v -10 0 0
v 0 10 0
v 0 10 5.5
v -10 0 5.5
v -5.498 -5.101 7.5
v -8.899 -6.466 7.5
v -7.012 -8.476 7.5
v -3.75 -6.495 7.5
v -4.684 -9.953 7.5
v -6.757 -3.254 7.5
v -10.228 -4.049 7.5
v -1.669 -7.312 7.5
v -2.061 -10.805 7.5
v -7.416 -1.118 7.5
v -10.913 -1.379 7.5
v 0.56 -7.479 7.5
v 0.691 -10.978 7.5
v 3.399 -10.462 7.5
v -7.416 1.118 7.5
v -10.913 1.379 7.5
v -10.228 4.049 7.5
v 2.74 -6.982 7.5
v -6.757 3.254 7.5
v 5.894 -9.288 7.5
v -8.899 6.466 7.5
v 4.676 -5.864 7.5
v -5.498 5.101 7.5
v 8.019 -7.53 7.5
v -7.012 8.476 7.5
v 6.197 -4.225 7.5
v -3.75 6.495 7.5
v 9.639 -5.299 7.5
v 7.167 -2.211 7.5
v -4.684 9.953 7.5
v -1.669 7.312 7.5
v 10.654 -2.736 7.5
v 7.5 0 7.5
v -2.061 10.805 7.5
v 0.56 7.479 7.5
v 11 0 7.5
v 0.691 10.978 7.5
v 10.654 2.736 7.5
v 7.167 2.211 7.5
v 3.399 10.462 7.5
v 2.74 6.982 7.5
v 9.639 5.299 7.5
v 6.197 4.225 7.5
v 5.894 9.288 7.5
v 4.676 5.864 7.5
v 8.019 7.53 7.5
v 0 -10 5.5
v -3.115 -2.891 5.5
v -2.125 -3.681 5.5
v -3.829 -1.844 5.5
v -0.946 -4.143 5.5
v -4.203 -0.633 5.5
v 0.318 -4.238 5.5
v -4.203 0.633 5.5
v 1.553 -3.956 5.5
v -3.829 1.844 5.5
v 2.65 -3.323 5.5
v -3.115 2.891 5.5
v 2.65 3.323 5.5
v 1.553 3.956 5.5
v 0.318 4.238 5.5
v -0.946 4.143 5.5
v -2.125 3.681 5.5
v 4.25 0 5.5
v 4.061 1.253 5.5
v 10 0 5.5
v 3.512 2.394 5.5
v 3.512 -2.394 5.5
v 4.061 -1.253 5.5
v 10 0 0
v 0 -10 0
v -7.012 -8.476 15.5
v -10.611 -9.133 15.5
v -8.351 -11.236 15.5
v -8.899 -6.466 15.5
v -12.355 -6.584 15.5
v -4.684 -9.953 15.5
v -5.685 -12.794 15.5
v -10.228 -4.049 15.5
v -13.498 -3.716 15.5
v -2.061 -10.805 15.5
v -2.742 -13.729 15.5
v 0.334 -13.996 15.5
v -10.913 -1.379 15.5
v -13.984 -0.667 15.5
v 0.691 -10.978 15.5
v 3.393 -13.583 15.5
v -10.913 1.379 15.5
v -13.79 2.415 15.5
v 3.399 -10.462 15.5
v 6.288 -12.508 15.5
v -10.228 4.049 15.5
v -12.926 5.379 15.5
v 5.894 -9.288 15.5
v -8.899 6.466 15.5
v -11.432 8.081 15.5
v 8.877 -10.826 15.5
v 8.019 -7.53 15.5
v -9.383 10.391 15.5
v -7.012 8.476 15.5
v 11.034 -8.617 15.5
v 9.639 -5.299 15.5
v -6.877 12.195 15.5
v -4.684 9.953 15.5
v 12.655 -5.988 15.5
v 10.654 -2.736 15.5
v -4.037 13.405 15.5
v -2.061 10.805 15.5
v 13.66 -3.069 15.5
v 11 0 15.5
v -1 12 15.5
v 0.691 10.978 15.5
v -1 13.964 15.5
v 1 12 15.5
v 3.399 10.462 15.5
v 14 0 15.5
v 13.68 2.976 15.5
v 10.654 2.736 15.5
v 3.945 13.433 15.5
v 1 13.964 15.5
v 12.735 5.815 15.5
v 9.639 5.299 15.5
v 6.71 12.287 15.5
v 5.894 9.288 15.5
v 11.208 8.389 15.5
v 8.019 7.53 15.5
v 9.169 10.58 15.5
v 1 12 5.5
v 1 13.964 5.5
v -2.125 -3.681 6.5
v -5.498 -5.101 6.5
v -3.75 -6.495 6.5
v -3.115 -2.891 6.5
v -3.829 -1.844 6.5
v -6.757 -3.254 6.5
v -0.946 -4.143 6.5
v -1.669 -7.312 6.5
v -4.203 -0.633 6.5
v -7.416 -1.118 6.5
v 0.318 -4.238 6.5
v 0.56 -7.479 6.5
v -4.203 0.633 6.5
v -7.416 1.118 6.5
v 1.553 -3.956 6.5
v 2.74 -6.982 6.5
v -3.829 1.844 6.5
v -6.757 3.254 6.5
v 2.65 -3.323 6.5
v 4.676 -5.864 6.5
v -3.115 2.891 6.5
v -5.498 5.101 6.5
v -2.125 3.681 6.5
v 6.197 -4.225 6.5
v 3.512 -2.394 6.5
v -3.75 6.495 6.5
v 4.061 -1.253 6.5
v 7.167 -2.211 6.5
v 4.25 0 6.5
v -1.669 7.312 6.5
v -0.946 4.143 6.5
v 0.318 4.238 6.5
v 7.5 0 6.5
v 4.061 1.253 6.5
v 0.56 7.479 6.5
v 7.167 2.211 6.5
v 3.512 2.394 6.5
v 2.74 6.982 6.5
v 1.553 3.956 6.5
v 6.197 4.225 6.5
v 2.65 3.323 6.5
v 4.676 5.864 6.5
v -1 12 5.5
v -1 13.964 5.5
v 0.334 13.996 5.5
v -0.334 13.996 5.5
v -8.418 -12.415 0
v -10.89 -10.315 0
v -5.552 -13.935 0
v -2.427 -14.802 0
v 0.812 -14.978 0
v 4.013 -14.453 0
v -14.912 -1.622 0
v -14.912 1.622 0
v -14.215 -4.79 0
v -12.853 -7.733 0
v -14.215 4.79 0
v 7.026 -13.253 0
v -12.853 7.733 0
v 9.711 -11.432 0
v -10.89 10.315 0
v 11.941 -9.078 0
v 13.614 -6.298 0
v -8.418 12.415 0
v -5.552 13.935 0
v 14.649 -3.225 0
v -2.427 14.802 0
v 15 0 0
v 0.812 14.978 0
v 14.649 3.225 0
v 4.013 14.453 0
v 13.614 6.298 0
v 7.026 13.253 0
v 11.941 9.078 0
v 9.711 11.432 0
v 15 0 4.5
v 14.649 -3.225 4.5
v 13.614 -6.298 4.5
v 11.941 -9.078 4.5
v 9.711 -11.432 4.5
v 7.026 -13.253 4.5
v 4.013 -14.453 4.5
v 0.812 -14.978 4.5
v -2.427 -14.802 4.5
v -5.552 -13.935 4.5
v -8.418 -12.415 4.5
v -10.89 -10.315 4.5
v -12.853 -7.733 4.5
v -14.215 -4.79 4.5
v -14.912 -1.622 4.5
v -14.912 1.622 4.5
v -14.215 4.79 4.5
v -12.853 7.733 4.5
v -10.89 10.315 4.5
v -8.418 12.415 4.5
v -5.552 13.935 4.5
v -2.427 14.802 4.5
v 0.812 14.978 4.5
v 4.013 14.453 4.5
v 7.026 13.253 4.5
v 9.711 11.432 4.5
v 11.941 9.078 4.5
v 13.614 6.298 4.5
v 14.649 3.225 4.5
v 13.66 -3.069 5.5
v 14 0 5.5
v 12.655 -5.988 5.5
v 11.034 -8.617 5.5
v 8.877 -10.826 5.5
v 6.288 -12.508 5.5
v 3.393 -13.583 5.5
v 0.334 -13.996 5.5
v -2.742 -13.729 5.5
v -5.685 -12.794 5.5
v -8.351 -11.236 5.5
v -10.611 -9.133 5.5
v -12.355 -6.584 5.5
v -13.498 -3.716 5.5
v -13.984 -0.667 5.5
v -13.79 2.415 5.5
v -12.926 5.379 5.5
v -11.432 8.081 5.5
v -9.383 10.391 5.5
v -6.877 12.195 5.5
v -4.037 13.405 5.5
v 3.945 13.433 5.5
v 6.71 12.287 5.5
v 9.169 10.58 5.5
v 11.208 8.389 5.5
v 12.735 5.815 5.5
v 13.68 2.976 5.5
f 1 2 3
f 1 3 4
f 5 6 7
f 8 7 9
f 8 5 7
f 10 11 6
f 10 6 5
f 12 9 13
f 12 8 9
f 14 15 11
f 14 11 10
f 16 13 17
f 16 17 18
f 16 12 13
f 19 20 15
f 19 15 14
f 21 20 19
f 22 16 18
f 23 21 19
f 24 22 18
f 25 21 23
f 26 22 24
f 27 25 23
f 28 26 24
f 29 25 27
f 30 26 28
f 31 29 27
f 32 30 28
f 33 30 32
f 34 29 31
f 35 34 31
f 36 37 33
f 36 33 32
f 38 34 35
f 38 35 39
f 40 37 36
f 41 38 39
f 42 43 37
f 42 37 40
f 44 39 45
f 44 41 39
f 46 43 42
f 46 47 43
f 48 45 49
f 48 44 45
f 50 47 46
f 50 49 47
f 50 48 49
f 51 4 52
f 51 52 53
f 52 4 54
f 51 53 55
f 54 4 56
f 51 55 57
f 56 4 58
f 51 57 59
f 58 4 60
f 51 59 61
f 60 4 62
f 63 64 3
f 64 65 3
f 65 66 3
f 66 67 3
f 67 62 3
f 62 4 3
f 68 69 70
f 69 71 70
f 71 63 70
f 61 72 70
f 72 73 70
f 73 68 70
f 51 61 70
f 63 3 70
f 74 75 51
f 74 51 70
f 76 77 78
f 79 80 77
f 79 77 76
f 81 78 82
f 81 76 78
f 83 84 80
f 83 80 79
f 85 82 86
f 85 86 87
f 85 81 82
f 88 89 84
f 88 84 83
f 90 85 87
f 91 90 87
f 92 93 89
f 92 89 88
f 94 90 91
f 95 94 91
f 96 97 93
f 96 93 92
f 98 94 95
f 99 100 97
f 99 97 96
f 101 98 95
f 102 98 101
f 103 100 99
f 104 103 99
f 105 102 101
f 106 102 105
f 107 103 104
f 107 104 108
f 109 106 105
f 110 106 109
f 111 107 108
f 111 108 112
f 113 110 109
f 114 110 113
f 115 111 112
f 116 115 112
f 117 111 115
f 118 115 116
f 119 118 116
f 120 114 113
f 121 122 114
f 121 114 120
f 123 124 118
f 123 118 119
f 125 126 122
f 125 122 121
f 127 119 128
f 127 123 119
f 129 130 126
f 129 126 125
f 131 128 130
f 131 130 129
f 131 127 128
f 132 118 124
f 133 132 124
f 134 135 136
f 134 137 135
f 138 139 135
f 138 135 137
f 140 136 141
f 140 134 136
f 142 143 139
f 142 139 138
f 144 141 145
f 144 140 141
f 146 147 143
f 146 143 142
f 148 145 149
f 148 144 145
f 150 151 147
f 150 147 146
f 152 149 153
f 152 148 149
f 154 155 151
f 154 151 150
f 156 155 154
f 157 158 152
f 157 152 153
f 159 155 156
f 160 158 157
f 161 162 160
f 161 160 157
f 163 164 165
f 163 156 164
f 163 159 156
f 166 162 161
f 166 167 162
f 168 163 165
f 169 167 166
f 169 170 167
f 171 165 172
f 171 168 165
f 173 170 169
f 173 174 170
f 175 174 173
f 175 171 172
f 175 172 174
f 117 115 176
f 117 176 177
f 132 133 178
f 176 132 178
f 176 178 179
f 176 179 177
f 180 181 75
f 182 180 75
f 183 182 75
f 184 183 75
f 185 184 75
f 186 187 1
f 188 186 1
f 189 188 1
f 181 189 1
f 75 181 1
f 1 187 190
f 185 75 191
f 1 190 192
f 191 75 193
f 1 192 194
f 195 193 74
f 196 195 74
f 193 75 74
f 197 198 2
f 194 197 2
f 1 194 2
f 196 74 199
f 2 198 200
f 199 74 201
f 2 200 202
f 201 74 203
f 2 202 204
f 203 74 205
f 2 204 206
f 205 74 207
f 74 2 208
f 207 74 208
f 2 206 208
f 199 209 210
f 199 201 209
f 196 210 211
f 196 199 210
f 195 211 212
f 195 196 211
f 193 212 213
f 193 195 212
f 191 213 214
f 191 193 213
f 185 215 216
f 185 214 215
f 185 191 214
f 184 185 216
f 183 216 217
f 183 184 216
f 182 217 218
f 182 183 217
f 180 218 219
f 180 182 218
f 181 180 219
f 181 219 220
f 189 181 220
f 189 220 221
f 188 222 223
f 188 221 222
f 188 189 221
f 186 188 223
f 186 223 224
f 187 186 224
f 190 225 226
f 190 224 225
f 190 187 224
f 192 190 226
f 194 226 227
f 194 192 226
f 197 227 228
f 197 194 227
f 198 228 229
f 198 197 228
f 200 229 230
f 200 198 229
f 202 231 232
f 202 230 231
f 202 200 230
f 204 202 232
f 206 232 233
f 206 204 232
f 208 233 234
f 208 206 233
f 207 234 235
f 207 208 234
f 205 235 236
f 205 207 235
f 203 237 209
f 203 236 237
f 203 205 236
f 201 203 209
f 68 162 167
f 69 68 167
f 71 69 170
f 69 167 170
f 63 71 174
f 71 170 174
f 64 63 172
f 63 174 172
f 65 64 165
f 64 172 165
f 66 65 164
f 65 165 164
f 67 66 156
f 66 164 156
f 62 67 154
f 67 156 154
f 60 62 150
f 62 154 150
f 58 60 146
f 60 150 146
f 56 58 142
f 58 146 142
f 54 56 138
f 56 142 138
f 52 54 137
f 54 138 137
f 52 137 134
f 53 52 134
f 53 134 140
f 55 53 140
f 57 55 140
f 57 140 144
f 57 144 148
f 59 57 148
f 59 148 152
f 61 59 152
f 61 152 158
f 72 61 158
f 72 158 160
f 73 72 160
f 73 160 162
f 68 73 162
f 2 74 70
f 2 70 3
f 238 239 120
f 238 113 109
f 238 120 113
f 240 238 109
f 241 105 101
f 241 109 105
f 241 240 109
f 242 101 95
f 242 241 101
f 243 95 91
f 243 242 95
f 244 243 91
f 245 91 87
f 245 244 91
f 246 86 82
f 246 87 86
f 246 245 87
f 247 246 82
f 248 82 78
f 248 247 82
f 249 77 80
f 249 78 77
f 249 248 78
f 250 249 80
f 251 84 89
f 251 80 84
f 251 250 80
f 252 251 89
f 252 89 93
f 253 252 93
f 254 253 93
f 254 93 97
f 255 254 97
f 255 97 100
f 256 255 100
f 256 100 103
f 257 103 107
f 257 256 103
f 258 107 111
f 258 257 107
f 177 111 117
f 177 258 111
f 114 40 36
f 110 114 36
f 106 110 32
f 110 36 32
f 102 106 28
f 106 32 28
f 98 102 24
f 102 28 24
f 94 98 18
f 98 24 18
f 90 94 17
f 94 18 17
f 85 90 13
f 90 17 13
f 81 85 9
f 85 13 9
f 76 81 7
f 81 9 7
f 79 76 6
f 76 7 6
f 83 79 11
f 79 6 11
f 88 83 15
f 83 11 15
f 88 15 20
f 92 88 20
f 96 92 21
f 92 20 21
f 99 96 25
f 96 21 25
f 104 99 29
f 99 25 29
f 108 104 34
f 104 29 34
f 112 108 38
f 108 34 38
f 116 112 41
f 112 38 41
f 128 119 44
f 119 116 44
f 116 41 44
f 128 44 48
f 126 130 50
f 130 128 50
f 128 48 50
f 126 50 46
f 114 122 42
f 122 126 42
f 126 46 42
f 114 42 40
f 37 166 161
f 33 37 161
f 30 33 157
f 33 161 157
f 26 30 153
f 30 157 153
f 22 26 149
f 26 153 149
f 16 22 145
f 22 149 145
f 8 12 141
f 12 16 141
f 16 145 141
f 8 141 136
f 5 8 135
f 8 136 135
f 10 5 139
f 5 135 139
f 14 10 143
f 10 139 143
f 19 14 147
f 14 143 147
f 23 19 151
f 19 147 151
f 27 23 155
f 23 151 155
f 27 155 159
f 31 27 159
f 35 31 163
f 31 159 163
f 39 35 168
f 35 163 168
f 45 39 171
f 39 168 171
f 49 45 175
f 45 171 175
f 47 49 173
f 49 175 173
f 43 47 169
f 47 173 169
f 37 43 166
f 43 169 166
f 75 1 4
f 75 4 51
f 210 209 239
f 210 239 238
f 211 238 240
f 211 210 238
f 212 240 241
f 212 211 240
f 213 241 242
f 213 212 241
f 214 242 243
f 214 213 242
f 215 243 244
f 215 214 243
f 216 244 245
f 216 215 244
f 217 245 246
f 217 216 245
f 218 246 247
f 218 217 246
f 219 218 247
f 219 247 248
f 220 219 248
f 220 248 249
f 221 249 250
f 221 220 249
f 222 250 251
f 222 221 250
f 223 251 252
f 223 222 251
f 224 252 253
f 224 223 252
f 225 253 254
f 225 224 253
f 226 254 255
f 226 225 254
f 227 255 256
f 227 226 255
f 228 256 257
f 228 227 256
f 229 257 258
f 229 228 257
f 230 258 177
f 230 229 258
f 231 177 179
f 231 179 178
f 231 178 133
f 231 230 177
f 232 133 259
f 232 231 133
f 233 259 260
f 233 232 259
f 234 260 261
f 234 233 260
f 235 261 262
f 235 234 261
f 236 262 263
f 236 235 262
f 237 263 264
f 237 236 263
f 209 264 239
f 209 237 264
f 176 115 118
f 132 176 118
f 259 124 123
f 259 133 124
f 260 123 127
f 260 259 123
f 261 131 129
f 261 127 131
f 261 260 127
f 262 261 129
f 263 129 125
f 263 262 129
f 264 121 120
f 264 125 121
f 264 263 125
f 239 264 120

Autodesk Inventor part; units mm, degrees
ref_plane "YZ Plane" through (0, 0, 0) normal (1, 0, 0) x (0, 1, 0)
ref_plane "XZ Plane" through (0, 0, 0) normal (0, 1, 0) x (-1, 0, 0)
sketch "Esquisse1" plane through (0, 0, 0) normal (0, 0, 1) x (1, 0, 0)
  circle A0 centre (0, 0) radius 15
  line L0 (0, 0) -> (-10, 0)
  line L1 (0, 0) -> (0, 10)
  line L2 (0, 0) -> (10, 0)
  line L3 (0, 0) -> (0, -10)
  line L4 (0, -10) -> (10, 0)
  line L5 (10, 0) -> (0, 10)
  line L6 (0, 10) -> (-10, 0)
  line L7 (-10, 0) -> (0, -10)
  dimension "d0" = 30
  dimension "d1" = 10
  dimension "d2" = 10
  dimension "d3" = 10
  dimension "d4" = 10
extrude "Extrusion1" add sketch "Esquisse1" along normal blind 5.5
chamfer "Chanfrein1" distance 1 angle 45 1 edges at (-15, 0, 5.5)
sketch "Esquisse2" plane through (0, 0, 5.5) normal (0, 0, 1) x (1, 0, 0)
  circle A0 centre (0, 0) radius 11.5
  circle A1 centre (0, 0) radius 14
  line L0 (0, -10) -> (-10, 0) projected
  line L1 (0, 10) -> (10, 0) projected
  line L2 (-10, 0) -> (0, 10)
  line L3 (0, 10) -> (10, 0)
  line L4 (10, 0) -> (0, -10)
  line L5 (0, -10) -> (-10, 0)
  dimension "d10" = 23
  dimension "d26" = 28
extrude "Extrusion2" add sketch "Esquisse2" along normal blind 1 contours A0 | A1 | L0 L2 L1 L4
sketch "Esquisse3" plane through (0, 0, 6.5) normal (0, 0, 1) x (1, 0, 0)
  circle A0 centre (0, 0) radius 11
  circle A1 centre (0, 0) radius 14
  dimension "d13" = 22
  dimension "d27" = 28
extrude "Extrusion3" add sketch "Esquisse3" along normal blind 9
sketch "Esquisse4" plane through (0, 0, 6.5) normal (0, 0, 1) x (1, 0, 0)
  circle A0 centre (0, 0) radius 4.25
  dimension "d16" = 8.5
extrude "Extrusion4" cut sketch "Esquisse4" against normal through all
ref_plane "Plan de construction1" through (0, 0, 15.5) normal (0, 0, -1) x (-1, 0, 0)
sketch "Esquisse6" plane through (0, 0, 15.5) normal (0, 0, -1) x (-1, 0, 0)
  circle A0 centre (0, 0) radius 14
  line L0 (0, 0) -> (0, 12)
  line L1 (0, 12) -> (-1, 12)
  line L2 (-1, 12) -> (-1, 13.9642)
  circle A1 centre (0, 0) radius 14 projected
  line L3 (0, 12) -> (1, 12)
  line L4 (1, 12) -> (1, 13.9642)
  dimension "d29" = 12
  dimension "d30" = 1
  dimension "d31" = 1
extrude "Extrusion6" cut sketch "Esquisse6" along normal blind 10 contours L4 L3 L1 L2 A0 picked at (-0.4445, 12.6653)
sketch "Esquisse7" plane through (0, 0, 6.5) normal (0, 0, 1) x (1, 0, 0)
  circle A0 centre (0, 0) radius 11 projected
  circle A1 centre (0, 0) radius 7.5
  dimension "d34" = 15
extrude "Extrusion7" add sketch "Esquisse7" along normal blind 1
properties part number "bielle côté 2"
